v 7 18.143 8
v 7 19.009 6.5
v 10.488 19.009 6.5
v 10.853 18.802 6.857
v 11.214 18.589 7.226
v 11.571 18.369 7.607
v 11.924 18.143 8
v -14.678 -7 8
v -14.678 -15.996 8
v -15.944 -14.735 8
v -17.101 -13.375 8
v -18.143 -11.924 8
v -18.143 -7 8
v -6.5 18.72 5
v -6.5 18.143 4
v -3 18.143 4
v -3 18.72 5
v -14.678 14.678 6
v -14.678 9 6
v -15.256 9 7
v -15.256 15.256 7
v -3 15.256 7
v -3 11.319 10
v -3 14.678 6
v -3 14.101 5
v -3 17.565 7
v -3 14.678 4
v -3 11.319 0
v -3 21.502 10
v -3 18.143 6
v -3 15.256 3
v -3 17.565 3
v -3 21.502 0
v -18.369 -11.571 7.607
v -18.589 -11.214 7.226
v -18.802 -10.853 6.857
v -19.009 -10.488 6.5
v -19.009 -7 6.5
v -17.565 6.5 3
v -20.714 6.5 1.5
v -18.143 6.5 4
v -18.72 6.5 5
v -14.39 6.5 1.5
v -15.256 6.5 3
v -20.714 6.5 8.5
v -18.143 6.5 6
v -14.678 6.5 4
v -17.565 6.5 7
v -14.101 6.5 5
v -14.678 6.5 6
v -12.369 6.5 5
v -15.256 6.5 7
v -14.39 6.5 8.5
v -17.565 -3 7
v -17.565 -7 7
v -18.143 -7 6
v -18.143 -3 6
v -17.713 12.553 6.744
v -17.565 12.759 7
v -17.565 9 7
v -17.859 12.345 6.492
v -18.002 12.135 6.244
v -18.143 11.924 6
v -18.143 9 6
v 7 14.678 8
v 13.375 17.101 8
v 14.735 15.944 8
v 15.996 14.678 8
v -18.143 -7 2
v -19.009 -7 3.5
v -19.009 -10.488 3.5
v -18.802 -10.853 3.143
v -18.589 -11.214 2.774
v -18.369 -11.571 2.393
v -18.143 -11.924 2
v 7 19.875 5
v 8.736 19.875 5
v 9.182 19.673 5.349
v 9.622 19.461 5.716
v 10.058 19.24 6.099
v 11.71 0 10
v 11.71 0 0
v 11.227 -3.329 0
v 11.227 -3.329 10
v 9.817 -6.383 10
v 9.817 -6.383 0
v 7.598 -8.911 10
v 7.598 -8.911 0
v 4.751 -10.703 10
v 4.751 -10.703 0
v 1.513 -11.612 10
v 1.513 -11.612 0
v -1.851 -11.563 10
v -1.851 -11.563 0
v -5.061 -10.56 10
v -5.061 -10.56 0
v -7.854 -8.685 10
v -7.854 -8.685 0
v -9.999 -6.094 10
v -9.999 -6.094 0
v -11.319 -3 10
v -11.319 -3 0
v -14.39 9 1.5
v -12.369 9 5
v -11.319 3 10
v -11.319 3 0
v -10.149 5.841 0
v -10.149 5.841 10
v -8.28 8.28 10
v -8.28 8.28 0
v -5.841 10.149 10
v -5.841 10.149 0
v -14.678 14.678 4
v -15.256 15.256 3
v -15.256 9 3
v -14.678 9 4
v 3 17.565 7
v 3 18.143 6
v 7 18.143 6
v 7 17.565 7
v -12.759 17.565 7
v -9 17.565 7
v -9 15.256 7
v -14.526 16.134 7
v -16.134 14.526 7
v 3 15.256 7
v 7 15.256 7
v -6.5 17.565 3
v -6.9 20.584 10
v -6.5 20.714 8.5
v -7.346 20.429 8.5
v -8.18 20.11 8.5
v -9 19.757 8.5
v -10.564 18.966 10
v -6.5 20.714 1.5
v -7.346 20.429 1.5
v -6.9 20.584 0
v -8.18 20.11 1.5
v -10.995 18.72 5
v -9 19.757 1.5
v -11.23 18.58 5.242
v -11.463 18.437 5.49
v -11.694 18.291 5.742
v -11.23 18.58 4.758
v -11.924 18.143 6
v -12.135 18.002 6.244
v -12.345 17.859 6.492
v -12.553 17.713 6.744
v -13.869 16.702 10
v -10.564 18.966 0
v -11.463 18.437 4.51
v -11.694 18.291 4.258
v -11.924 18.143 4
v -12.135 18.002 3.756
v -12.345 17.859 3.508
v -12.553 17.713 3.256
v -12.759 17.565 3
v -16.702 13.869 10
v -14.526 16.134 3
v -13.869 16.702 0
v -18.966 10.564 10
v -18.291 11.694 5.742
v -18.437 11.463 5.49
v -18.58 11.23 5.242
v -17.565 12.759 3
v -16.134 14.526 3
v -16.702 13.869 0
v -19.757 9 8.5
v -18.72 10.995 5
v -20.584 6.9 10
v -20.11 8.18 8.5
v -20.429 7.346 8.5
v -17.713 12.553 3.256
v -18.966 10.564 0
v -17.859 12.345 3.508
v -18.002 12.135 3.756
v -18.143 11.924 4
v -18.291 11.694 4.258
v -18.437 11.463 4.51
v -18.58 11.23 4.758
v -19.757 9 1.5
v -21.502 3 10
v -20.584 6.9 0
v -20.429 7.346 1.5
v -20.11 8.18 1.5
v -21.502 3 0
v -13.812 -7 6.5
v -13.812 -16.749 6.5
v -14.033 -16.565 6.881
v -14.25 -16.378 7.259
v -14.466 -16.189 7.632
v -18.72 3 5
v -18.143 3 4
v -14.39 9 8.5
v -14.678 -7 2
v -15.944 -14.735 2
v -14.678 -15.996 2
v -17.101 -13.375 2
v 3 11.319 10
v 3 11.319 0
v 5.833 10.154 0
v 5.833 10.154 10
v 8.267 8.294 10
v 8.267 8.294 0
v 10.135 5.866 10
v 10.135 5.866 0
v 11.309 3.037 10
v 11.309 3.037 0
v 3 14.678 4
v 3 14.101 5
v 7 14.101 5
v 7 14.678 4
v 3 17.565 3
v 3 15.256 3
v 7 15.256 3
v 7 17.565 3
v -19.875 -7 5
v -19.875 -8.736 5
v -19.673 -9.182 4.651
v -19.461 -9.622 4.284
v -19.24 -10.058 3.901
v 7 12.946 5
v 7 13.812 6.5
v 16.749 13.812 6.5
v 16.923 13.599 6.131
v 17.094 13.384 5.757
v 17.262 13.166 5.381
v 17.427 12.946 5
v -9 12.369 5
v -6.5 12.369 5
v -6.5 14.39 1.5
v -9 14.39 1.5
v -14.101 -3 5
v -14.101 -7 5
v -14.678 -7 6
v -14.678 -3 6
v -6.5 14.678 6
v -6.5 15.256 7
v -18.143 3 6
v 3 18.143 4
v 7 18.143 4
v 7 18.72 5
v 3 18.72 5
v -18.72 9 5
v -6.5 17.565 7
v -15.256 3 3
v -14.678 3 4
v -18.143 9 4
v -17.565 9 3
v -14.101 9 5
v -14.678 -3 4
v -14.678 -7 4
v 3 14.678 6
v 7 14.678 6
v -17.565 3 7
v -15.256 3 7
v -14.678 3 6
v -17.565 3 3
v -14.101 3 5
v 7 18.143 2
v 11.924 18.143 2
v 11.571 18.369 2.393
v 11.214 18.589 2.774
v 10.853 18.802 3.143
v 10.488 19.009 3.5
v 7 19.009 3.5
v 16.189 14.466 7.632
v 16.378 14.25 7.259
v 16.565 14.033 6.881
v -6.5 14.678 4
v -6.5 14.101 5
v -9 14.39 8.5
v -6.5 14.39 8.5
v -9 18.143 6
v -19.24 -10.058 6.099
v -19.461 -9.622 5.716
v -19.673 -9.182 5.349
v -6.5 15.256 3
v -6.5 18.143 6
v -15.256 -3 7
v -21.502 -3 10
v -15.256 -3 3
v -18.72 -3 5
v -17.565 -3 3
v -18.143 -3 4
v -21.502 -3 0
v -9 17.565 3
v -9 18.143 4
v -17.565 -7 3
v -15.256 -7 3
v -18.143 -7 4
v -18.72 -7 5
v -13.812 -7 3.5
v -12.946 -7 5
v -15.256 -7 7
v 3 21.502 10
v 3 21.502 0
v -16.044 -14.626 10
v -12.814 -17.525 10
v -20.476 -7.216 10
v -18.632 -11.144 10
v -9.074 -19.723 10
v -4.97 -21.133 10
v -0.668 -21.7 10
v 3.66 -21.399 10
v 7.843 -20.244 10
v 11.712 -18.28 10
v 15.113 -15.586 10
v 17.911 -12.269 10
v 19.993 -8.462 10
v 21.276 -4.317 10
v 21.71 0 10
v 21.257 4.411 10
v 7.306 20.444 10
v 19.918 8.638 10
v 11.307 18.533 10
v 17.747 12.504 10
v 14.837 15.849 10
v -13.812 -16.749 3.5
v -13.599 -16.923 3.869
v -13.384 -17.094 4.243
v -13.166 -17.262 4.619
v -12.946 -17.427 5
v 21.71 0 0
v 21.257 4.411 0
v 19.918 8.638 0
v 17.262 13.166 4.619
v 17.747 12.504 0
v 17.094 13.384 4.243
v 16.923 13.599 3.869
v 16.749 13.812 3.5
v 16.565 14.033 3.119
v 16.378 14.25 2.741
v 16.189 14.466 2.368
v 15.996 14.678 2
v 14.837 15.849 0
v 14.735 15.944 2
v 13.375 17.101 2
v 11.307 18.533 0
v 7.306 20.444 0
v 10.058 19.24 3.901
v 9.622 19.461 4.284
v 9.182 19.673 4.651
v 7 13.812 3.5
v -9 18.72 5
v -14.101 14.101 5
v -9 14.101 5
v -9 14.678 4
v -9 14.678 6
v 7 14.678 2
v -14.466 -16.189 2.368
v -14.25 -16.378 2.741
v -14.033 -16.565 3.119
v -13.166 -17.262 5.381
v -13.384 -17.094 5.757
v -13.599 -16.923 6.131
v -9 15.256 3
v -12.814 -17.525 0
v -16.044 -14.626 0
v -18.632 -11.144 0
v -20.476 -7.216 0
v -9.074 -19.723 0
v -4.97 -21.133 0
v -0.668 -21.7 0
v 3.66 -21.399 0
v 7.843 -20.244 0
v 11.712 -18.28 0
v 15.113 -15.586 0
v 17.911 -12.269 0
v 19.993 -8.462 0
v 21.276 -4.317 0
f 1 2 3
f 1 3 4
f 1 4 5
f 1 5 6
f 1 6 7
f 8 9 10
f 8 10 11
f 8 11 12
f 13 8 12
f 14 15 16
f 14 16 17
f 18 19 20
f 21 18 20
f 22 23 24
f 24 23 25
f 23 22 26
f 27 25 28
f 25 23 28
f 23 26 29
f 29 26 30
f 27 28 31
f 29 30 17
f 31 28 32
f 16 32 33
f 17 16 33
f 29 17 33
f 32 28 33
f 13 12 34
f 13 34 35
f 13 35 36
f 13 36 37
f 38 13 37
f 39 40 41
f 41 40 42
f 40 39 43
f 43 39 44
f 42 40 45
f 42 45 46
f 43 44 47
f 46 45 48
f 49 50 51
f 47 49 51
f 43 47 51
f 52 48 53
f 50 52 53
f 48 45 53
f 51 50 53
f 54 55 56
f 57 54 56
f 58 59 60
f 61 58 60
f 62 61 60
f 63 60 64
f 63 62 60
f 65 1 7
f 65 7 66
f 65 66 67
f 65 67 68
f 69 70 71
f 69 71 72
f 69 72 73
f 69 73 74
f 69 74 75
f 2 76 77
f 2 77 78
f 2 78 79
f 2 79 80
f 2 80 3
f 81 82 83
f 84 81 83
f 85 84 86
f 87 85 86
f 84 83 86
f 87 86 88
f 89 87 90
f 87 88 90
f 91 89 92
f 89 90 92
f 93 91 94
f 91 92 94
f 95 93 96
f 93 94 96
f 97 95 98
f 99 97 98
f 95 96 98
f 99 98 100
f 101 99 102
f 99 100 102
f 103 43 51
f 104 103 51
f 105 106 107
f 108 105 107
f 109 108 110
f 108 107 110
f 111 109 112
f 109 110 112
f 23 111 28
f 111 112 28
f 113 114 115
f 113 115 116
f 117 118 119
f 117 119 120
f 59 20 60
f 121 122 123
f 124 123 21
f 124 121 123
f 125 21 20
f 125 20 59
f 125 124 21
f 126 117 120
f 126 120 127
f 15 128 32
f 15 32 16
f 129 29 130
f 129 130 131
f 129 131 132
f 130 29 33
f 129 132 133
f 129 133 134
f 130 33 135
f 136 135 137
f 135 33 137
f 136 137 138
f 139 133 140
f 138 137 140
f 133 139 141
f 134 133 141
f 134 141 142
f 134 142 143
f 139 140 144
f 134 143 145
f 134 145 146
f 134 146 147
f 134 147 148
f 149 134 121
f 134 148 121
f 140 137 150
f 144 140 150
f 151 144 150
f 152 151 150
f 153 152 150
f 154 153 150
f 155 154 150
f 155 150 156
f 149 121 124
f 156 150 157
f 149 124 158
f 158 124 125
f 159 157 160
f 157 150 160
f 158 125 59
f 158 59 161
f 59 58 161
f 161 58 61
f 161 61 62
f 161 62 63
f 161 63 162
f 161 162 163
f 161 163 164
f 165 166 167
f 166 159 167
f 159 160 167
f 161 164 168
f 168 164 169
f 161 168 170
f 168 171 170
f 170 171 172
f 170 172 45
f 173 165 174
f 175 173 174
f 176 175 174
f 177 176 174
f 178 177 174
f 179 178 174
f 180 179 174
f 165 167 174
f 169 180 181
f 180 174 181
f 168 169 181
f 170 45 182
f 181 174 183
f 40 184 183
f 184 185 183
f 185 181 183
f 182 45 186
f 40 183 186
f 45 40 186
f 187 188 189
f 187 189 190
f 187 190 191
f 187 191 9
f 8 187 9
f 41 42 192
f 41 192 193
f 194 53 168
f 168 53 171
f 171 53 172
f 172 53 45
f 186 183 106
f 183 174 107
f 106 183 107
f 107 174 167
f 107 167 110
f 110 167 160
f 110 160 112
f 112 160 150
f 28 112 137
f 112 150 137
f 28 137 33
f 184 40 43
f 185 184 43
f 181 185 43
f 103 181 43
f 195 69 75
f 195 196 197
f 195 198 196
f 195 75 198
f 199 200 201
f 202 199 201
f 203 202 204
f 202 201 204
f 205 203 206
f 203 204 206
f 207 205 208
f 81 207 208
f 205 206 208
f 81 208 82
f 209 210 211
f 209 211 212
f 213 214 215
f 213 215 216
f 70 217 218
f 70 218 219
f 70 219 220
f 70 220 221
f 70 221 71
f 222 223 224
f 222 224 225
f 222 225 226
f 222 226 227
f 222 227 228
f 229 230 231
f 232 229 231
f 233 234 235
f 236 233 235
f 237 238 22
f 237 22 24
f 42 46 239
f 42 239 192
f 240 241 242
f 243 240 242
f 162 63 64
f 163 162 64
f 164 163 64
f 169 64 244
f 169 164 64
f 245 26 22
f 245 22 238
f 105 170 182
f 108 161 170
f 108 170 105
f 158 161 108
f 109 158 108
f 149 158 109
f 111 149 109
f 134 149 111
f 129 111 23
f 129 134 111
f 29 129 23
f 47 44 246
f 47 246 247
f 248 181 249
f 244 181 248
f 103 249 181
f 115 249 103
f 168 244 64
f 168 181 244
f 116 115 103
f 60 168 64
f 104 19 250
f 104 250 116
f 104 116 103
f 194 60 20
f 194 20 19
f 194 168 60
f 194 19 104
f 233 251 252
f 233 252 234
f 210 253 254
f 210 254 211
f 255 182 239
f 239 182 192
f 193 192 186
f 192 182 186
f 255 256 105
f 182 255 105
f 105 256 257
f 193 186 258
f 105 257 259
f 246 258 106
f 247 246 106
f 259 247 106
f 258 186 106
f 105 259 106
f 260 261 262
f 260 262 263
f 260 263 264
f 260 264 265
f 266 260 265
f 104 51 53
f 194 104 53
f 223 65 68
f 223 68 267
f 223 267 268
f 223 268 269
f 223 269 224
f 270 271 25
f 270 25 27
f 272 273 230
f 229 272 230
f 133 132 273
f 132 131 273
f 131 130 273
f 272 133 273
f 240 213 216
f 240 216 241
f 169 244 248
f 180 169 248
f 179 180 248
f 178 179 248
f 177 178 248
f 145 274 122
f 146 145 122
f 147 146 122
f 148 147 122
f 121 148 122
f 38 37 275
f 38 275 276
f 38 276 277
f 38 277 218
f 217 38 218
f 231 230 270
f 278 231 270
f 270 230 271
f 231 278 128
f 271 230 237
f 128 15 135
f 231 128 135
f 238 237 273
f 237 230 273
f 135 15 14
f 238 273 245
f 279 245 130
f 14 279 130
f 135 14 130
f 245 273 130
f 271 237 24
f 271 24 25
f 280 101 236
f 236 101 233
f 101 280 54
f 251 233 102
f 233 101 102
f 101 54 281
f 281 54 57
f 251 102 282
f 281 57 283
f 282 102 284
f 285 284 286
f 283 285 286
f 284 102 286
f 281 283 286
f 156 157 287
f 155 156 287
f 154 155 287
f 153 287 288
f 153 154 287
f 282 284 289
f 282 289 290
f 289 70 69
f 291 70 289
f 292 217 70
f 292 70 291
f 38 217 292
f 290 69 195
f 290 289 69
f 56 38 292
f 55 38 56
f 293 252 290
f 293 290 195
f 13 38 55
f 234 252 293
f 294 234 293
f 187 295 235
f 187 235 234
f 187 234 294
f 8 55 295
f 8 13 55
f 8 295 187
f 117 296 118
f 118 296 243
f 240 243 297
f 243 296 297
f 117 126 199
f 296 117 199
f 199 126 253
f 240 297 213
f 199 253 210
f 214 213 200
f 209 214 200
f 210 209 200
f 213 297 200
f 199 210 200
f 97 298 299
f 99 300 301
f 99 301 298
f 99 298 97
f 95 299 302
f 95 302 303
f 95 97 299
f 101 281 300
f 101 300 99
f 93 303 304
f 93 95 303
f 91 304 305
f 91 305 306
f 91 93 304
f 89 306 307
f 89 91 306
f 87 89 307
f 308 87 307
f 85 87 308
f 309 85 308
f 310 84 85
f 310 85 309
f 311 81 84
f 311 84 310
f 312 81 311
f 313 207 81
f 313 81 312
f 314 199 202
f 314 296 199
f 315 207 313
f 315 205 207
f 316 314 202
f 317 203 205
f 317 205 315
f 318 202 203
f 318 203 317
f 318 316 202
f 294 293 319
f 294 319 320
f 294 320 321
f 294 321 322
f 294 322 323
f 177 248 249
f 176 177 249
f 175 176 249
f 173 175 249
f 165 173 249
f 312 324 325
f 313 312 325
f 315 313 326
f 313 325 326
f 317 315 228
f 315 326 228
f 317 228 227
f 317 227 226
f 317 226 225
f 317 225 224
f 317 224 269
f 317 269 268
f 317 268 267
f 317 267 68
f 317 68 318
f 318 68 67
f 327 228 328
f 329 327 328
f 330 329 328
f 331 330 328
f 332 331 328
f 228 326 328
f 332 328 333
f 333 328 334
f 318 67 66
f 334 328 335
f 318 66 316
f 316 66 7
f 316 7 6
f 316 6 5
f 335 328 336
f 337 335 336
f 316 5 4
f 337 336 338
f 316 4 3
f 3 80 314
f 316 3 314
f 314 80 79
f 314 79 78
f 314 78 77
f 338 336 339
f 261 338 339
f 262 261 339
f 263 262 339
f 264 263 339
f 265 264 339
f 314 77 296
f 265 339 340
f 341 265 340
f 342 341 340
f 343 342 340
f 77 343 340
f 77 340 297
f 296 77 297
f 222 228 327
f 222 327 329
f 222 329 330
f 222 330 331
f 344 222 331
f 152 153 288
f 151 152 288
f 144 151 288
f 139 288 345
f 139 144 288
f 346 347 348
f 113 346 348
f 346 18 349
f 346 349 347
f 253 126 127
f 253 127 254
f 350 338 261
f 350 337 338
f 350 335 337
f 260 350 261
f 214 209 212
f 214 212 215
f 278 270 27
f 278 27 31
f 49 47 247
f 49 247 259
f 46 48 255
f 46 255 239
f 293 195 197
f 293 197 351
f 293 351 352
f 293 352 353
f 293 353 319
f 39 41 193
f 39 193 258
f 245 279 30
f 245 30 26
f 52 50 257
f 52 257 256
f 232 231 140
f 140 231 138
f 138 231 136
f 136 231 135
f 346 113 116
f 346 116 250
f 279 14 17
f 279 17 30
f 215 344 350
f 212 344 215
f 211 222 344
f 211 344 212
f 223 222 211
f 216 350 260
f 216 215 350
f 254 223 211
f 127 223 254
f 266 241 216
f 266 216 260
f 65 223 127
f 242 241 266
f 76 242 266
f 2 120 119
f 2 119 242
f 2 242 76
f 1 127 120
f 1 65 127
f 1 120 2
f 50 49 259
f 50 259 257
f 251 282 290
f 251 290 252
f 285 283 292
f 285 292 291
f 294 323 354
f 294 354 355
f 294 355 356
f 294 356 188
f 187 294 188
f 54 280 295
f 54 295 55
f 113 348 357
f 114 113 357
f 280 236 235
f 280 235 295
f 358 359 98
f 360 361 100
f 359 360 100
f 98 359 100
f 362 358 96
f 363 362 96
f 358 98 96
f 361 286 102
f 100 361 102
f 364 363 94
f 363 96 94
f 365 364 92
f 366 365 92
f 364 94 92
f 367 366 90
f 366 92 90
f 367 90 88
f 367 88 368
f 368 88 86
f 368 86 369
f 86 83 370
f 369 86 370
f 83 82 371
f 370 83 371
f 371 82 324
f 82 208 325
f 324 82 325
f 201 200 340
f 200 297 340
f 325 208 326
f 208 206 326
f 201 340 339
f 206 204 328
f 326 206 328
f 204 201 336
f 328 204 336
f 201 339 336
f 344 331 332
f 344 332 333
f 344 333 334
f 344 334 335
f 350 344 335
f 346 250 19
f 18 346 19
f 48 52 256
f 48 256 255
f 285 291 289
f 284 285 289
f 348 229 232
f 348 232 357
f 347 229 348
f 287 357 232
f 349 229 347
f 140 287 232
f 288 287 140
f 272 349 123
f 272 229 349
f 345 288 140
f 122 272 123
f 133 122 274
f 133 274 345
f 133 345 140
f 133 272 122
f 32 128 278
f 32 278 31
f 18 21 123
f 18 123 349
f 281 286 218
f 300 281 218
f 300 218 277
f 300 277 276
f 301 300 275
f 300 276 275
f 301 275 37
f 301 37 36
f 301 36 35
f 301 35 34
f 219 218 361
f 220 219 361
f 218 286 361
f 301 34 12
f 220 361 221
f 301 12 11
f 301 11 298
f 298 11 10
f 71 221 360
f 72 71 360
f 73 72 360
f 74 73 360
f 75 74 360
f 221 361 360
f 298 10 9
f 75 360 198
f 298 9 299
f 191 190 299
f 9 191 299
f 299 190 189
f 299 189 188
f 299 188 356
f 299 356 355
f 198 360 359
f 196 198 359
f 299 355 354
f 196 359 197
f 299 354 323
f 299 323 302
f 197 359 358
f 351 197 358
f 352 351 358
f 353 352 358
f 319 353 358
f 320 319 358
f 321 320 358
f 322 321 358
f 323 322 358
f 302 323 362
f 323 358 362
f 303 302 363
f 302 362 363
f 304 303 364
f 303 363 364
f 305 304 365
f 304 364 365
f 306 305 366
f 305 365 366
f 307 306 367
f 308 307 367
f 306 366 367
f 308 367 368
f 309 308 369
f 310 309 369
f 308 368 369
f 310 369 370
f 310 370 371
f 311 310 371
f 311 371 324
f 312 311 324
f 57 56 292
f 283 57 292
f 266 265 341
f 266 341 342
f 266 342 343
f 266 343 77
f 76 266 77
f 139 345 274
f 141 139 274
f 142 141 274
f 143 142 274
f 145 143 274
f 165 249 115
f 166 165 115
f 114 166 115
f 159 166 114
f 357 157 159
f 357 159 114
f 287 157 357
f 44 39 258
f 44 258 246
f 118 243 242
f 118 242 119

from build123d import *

# Parameters (mm, degrees)
F1_DEPTH      = 10
F3_DEPTH      = 18.5027231868
F3_DEPTH_BACK = 24.711
F5_DEPTH      = 18.5027231868
F5_DEPTH_BACK = 24.711
F6_START      = 10
F6_DEPTH      = 15
F7_START      = 10
F7_DEPTH      = 15
F8_R          = 1.5
F9_DEPTH      = 25
F10_R         = 1.5
F11_DEPTH     = 25
F12_START     = -3.5
F12_DEPTH     = 2.5
F13_START     = -3.5
F13_DEPTH     = 2.5


with BuildPart() as f1:
    # F0 (on Top) → F1 (new body)
    with BuildSketch(Plane.XY):
        with BuildLine():
            ThreePointArc((-11.3191916673, 3), (-8.2802204077, 8.2802204077), (-3, 11.3191916673))
            Line((-3, 11.3191916673), (-3, 21.5017231868))
            ThreePointArc((-3, 21.5017231868), (-15.3512882196, 15.3512882196), (-21.5017231868, 3))
            Line((-21.5017231868, 3), (-11.3191916673, 3))
        make_face()
    extrude(amount=F1_DEPTH)


with BuildPart() as f1b:
    # F0 (on Top) → F1, piece 2 (new body)
    with BuildSketch(Plane.XY):
        with BuildLine():
            ThreePointArc((3, 11.3191916673), (9.2804660443, 7.1412218842), (11.71, 0))
            ThreePointArc((11.71, 0), (1.5126740522, -11.6118868928), (-11.3191916673, -3))
            Line((-11.3191916673, -3), (-21.5017231868, -3))
            ThreePointArc((-21.5017231868, -3), (1.5036105905, -21.6578682052), (21.71, 0))
            ThreePointArc((21.71, 0), (16.3776387187, 14.2512122291), (3, 21.5017231868))
            Line((3, 21.5017231868), (3, 11.3191916673))
        make_face()
    extrude(amount=F1_DEPTH)


with BuildPart() as f3_tool:
    # F2 (on face) → F3 (new body, two sides)
    with BuildSketch(Plane.XZ.offset(-3)) as f3_sk:
        with BuildLine():
            Line((-17.5651579654, 3), (-16.410457427, 3))
            ThreePointArc((-16.410457427, 3), (-17.4104574053, 3.2679491799), (-18.1425082096, 3.9999999567))
            Line((-18.1425082096, 3.9999999567), (-17.5651579654, 3))
        make_face()
        with BuildLine():
            Line((-15.2557568886, 3), (-14.6784066445, 3.9999999567))
            ThreePointArc((-14.6784066445, 3.9999999567), (-15.4104574487, 3.2679491799), (-16.410457427, 3))
            Line((-16.410457427, 3), (-15.2557568886, 3))
        make_face()
        with BuildLine():
            ThreePointArc((-14.6784066445, 6.0000000433), (-14.4786057809, 5.5176381144), (-14.410457427, 5))
            ThreePointArc((-14.410457427, 5), (-14.4786057809, 4.4823618856), (-14.6784066445, 3.9999999567))
            Line((-14.6784066445, 3.9999999567), (-14.1010563502, 5))
            Line((-14.1010563502, 5), (-14.6784066445, 6.0000000433))
        make_face()
        with BuildLine():
            ThreePointArc((-16.410457427, 7), (-15.4104574487, 6.7320508201), (-14.6784066445, 6.0000000433))
            Line((-14.6784066445, 6.0000000433), (-15.2557568886, 7))
            Line((-15.2557568886, 7), (-16.410457427, 7))
        make_face()
        with BuildLine():
            ThreePointArc((-18.1425082096, 3.9999999567), (-18.410457427, 4.9999999686), (-18.142508241, 5.9999999889))
            Line((-18.142508241, 5.9999999889), (-18.7198585038, 5))
            Line((-18.7198585038, 5), (-18.1425082096, 3.9999999567))
        make_face()
        with BuildLine():
            ThreePointArc((-14.6784066445, 3.9999999567), (-14.4786057809, 4.4823618856), (-14.410457427, 5))
            ThreePointArc((-14.410457427, 5), (-14.4786057809, 5.5176381144), (-14.6784066445, 6.0000000433))
            ThreePointArc((-14.6784066445, 6.0000000433), (-15.4104574487, 6.7320508201), (-16.410457427, 7))
            ThreePointArc((-16.410457427, 7), (-17.4104574326, 6.7320508044), (-18.142508241, 5.9999999889))
            ThreePointArc((-18.142508241, 5.9999999889), (-18.410457427, 4.9999999686), (-18.1425082096, 3.9999999567))
            ThreePointArc((-18.1425082096, 3.9999999567), (-17.4104574053, 3.2679491799), (-16.410457427, 3))
            ThreePointArc((-16.410457427, 3), (-15.4104574487, 3.2679491799), (-14.6784066445, 3.9999999567))
        make_face()
        with BuildLine():
            ThreePointArc((-18.142508241, 5.9999999889), (-17.4104574326, 6.7320508044), (-16.410457427, 7))
            Line((-16.410457427, 7), (-17.5651579654, 7))
            Line((-17.5651579654, 7), (-18.142508241, 5.9999999889))
        make_face()
    extrude(amount=-F3_DEPTH)
    extrude(f3_sk.sketch, amount=F3_DEPTH_BACK)


with BuildPart() as f1_1:
    add(f1.part)

    # F3: cut by f3_tool
    add(f3_tool.part, mode=Mode.SUBTRACT)


with BuildPart() as f1b_1:
    add(f1b.part)

    # F3: cut by f3_tool
    add(f3_tool.part, mode=Mode.SUBTRACT)


with BuildPart() as f5_tool:
    # F4 (on face) → F5 (new body, two sides)
    with BuildSketch(Plane.YZ.offset(-3)) as f5_sk:
        with BuildLine():
            ThreePointArc((16.410457427, 7), (17.4104574053, 6.7320508201), (18.1425082096, 6.0000000433))
            Line((18.1425082096, 6.0000000433), (17.5651579654, 7))
            Line((17.5651579654, 7), (16.410457427, 7))
        make_face()
        with BuildLine():
            Line((17.5651579654, 3), (18.142508241, 4.0000000111))
            ThreePointArc((18.142508241, 4.0000000111), (17.4104574326, 3.2679491956), (16.410457427, 3))
            Line((16.410457427, 3), (17.5651579654, 3))
        make_face()
        with BuildLine():
            ThreePointArc((18.1425082096, 6.0000000433), (18.3423090731, 5.5176381144), (18.410457427, 5))
            ThreePointArc((18.410457427, 5), (18.3423090812, 4.482361916), (18.142508241, 4.0000000111))
            Line((18.142508241, 4.0000000111), (18.7198585038, 5))
            Line((18.7198585038, 5), (18.1425082096, 6.0000000433))
        make_face()
        with BuildLine():
            ThreePointArc((14.6784066324, 6.0000000225), (15.4104574383, 6.7320508141), (16.410457427, 7))
            Line((16.410457427, 7), (15.2557568886, 7))
            Line((15.2557568886, 7), (14.6784066324, 6.0000000225))
        make_face()
        with BuildLine():
            ThreePointArc((14.678406613, 4.0000000111), (14.410457427, 5.0000000194), (14.6784066324, 6.0000000225))
            Line((14.6784066324, 6.0000000225), (14.1010563502, 5))
            Line((14.1010563502, 5), (14.678406613, 4.0000000111))
        make_face()
        with BuildLine():
            Line((15.2557568886, 3), (16.410457427, 3))
            ThreePointArc((16.410457427, 3), (15.4104574214, 3.2679491956), (14.678406613, 4.0000000111))
            Line((14.678406613, 4.0000000111), (15.2557568886, 3))
        make_face()
        with BuildLine():
            ThreePointArc((18.142508241, 4.0000000111), (18.3423090812, 4.482361916), (18.410457427, 5))
            ThreePointArc((18.410457427, 5), (18.3423090731, 5.5176381144), (18.1425082096, 6.0000000433))
            ThreePointArc((18.1425082096, 6.0000000433), (17.4104574053, 6.7320508201), (16.410457427, 7))
            ThreePointArc((16.410457427, 7), (15.4104574383, 6.7320508141), (14.6784066324, 6.0000000225))
            ThreePointArc((14.6784066324, 6.0000000225), (14.410457427, 5.0000000194), (14.678406613, 4.0000000111))
            ThreePointArc((14.678406613, 4.0000000111), (15.4104574214, 3.2679491956), (16.410457427, 3))
            ThreePointArc((16.410457427, 3), (17.4104574326, 3.2679491956), (18.142508241, 4.0000000111))
        make_face()
    extrude(amount=-F5_DEPTH)
    extrude(f5_sk.sketch, amount=F5_DEPTH_BACK)


with BuildPart() as f1_2:
    add(f1_1.part)

    # F5: cut by f5_tool
    add(f5_tool.part, mode=Mode.SUBTRACT)

    # F8 (on face) → F9 (cut)
    with BuildSketch(Plane(origin=(3, 0, 0), x_dir=(0, -1, 0), z_dir=(-1, 0, 0))):
        with Locations((-16.410457427, 5)):
            Circle(F8_R)
    extrude(amount=-F9_DEPTH, mode=Mode.SUBTRACT)

    # F10 (on face) → F11 (cut)
    with BuildSketch(Plane(origin=(0, -3, 0), x_dir=(-1, 0, 0), z_dir=(0, 1, 0))):
        with Locations((16.410457427, 5)):
            Circle(F10_R)
    extrude(amount=-F11_DEPTH, mode=Mode.SUBTRACT)

    # F4 (on face) → F12 (cut)
    with BuildSketch(Plane.YZ.offset(-3).offset(F12_START)):
        Polygon((20.4519093113, 5), (18.4311833692, 1.5), (21.5017231868, 1.5), (21.5017231868, 8.5), (18.4311833692, 8.5), align=None)
        Polygon((14.3897314848, 1.5), (18.4311833692, 1.5), (20.4519093113, 5), (18.4311833692, 8.5), (14.3897314848, 8.5), (12.3690055427, 5), align=None)
        Polygon((18.1425082346, 8), (19.0085336253, 6.5000000226), (19.8745590421, 5), (19.0085336636, 3.5000000436), (18.1425082346, 2), (16.410457427, 2), (14.6784066194, 2), (13.8123811995, 3.500000028), (12.9463558119, 5), (13.8123812433, 6.5000000478), (14.6784066194, 8), (16.410457427, 8), align=None, mode=Mode.SUBTRACT)
        with BuildLine():
            ThreePointArc((19.0085336253, 6.5000000226), (19.3082349025, 5.7764571479), (19.410457427, 5))
            ThreePointArc((19.410457427, 5), (19.3082349124, 4.223542889), (19.0085336636, 3.5000000436))
            Line((19.0085336636, 3.5000000436), (19.8745590421, 5))
            Line((19.8745590421, 5), (19.0085336253, 6.5000000226))
        make_face()
        with BuildLine():
            ThreePointArc((16.410457427, 8), (17.9104574157, 7.5980762179), (19.0085336253, 6.5000000226))
            Line((19.0085336253, 6.5000000226), (18.1425082346, 8))
            Line((18.1425082346, 8), (16.410457427, 8))
        make_face()
        with BuildLine():
            Line((18.1425082346, 2), (19.0085336636, 3.5000000436))
            ThreePointArc((19.0085336636, 3.5000000436), (17.9104574488, 2.4019238012), (16.410457427, 2))
            Line((16.410457427, 2), (18.1425082346, 2))
        make_face()
        with BuildLine():
            Line((14.6784066194, 2), (16.410457427, 2))
            ThreePointArc((16.410457427, 2), (14.910457413, 2.4019237967), (13.8123811995, 3.500000028))
            Line((13.8123811995, 3.500000028), (14.6784066194, 2))
        make_face()
        with BuildLine():
            ThreePointArc((13.8123811995, 3.500000028), (13.410457427, 5.0000000438), (13.8123812433, 6.5000000478))
            Line((13.8123812433, 6.5000000478), (12.9463558119, 5))
            Line((12.9463558119, 5), (13.8123811995, 3.500000028))
        make_face()
        with BuildLine():
            ThreePointArc((13.8123812433, 6.5000000478), (14.9104574509, 7.5980762252), (16.410457427, 8))
            Line((16.410457427, 8), (14.6784066194, 8))
            Line((14.6784066194, 8), (13.8123812433, 6.5000000478))
        make_face()
        with BuildLine():
            ThreePointArc((19.0085336636, 3.5000000436), (19.3082349124, 4.223542889), (19.410457427, 5))
            ThreePointArc((19.410457427, 5), (19.3082349025, 5.7764571479), (19.0085336253, 6.5000000226))
            ThreePointArc((19.0085336253, 6.5000000226), (17.9104574157, 7.5980762179), (16.410457427, 8))
            ThreePointArc((16.410457427, 8), (14.9104574509, 7.5980762252), (13.8123812433, 6.5000000478))
            ThreePointArc((13.8123812433, 6.5000000478), (13.410457427, 5.0000000438), (13.8123811995, 3.500000028))
            ThreePointArc((13.8123811995, 3.500000028), (14.910457413, 2.4019237967), (16.410457427, 2))
            ThreePointArc((16.410457427, 2), (17.9104574488, 2.4019238012), (19.0085336636, 3.5000000436))
        make_face()
        Polygon((17.5651579654, 7), (18.1425082096, 6.0000000433), (18.7198585038, 5), (18.142508241, 4.0000000111), (17.5651579654, 3), (16.410457427, 3), (15.2557568886, 3), (14.678406613, 4.0000000111), (14.1010563502, 5), (14.6784066324, 6.0000000225), (15.2557568886, 7), (16.410457427, 7), align=None, mode=Mode.SUBTRACT)
    extrude(amount=-F12_DEPTH, mode=Mode.SUBTRACT)

    # F2 (on face) → F13 (cut)
    with BuildSketch(Plane.XZ.offset(-3).offset(F13_START)):
        Polygon((-20.4519093113, 5), (-18.4311833692, 8.5), (-21.5017231868, 8.5), (-21.5017231868, 1.5), (-18.4311833692, 1.5), align=None)
        Polygon((-14.3897314848, 8.5), (-18.4311833692, 8.5), (-20.4519093113, 5), (-18.4311833692, 1.5), (-14.3897314848, 1.5), (-12.3690055427, 5), align=None)
        Polygon((-14.6784066194, 8), (-13.8123811905, 6.4999999564), (-12.9463558119, 5), (-13.8123812523, 3.4999999365), (-14.6784066194, 2), (-16.410457427, 2), (-18.1425082346, 2), (-19.0085336787, 3.5000000698), (-19.8745590421, 5), (-19.0085335545, 6.5000001453), (-18.1425082346, 8), (-16.410457427, 8), align=None, mode=Mode.SUBTRACT)
        with BuildLine():
            ThreePointArc((-19.0085336787, 3.5000000698), (-19.410457427, 5.0000001242), (-19.0085335545, 6.5000001453))
            Line((-19.0085335545, 6.5000001453), (-19.8745590421, 5))
            Line((-19.8745590421, 5), (-19.0085336787, 3.5000000698))
        make_face()
        with BuildLine():
            Line((-18.1425082346, 2), (-16.410457427, 2))
            ThreePointArc((-16.410457427, 2), (-17.9104574619, 2.4019238088), (-19.0085336787, 3.5000000698))
            Line((-19.0085336787, 3.5000000698), (-18.1425082346, 2))
        make_face()
        with BuildLine():
            ThreePointArc((-19.0085335545, 6.5000001453), (-17.9104573544, 7.5980762533), (-16.410457427, 8))
            Line((-16.410457427, 8), (-18.1425082346, 8))
            Line((-18.1425082346, 8), (-19.0085335545, 6.5000001453))
        make_face()
        with BuildLine():
            ThreePointArc((-16.410457427, 8), (-14.9104574052, 7.5980761988), (-13.8123811905, 6.4999999564))
            Line((-13.8123811905, 6.4999999564), (-14.6784066194, 8))
            Line((-14.6784066194, 8), (-16.410457427, 8))
        make_face()
        with BuildLine():
            ThreePointArc((-13.8123811905, 6.4999999564), (-13.5126799416, 5.776457111), (-13.410457427, 5))
            ThreePointArc((-13.410457427, 5), (-13.5126799576, 4.2235428293), (-13.8123812523, 3.4999999365))
            Line((-13.8123812523, 3.4999999365), (-12.9463558119, 5))
            Line((-12.9463558119, 5), (-13.8123811905, 6.4999999564))
        make_face()
        with BuildLine():
            Line((-14.6784066194, 2), (-13.8123812523, 3.4999999365))
            ThreePointArc((-13.8123812523, 3.4999999365), (-14.9104574587, 2.4019237703), (-16.410457427, 2))
            Line((-16.410457427, 2), (-14.6784066194, 2))
        make_face()
        with BuildLine():
            ThreePointArc((-13.8123812523, 3.4999999365), (-13.5126799576, 4.2235428293), (-13.410457427, 5))
            ThreePointArc((-13.410457427, 5), (-13.5126799416, 5.776457111), (-13.8123811905, 6.4999999564))
            ThreePointArc((-13.8123811905, 6.4999999564), (-14.9104574052, 7.5980761988), (-16.410457427, 8))
            ThreePointArc((-16.410457427, 8), (-17.9104573544, 7.5980762533), (-19.0085335545, 6.5000001453))
            ThreePointArc((-19.0085335545, 6.5000001453), (-19.410457427, 5.0000001242), (-19.0085336787, 3.5000000698))
            ThreePointArc((-19.0085336787, 3.5000000698), (-17.9104574619, 2.4019238088), (-16.410457427, 2))
            ThreePointArc((-16.410457427, 2), (-14.9104574587, 2.4019237703), (-13.8123812523, 3.4999999365))
        make_face()
        Polygon((-15.2557568886, 7), (-14.6784066445, 6.0000000433), (-14.1010563502, 5), (-14.6784066445, 3.9999999567), (-15.2557568886, 3), (-16.410457427, 3), (-17.5651579654, 3), (-18.1425082096, 3.9999999567), (-18.7198585038, 5), (-18.142508241, 5.9999999889), (-17.5651579654, 7), (-16.410457427, 7), align=None, mode=Mode.SUBTRACT)
    extrude(amount=-F13_DEPTH, mode=Mode.SUBTRACT)


with BuildPart() as f1b_2:
    add(f1b_1.part)

    # F5: cut by f5_tool
    add(f5_tool.part, mode=Mode.SUBTRACT)

    # F2 (on face) → F6 (cut)
    with BuildSketch(Plane.XZ.offset(-3).offset(F6_START)):
        with BuildLine():
            ThreePointArc((-13.8123812523, 3.4999999365), (-13.5126799576, 4.2235428293), (-13.410457427, 5))
            ThreePointArc((-13.410457427, 5), (-13.5126799416, 5.776457111), (-13.8123811905, 6.4999999564))
            ThreePointArc((-13.8123811905, 6.4999999564), (-14.9104574052, 7.5980761988), (-16.410457427, 8))
            ThreePointArc((-16.410457427, 8), (-17.9104573544, 7.5980762533), (-19.0085335545, 6.5000001453))
            ThreePointArc((-19.0085335545, 6.5000001453), (-19.410457427, 5.0000001242), (-19.0085336787, 3.5000000698))
            ThreePointArc((-19.0085336787, 3.5000000698), (-17.9104574619, 2.4019238088), (-16.410457427, 2))
            ThreePointArc((-16.410457427, 2), (-14.9104574587, 2.4019237703), (-13.8123812523, 3.4999999365))
        make_face()
        Polygon((-15.2557568886, 7), (-14.6784066445, 6.0000000433), (-14.1010563502, 5), (-14.6784066445, 3.9999999567), (-15.2557568886, 3), (-16.410457427, 3), (-17.5651579654, 3), (-18.1425082096, 3.9999999567), (-18.7198585038, 5), (-18.142508241, 5.9999999889), (-17.5651579654, 7), (-16.410457427, 7), align=None, mode=Mode.SUBTRACT)
        with BuildLine():
            ThreePointArc((-19.0085335545, 6.5000001453), (-17.9104573544, 7.5980762533), (-16.410457427, 8))
            Line((-16.410457427, 8), (-18.1425082346, 8))
            Line((-18.1425082346, 8), (-19.0085335545, 6.5000001453))
        make_face()
        with BuildLine():
            ThreePointArc((-19.0085336787, 3.5000000698), (-19.410457427, 5.0000001242), (-19.0085335545, 6.5000001453))
            Line((-19.0085335545, 6.5000001453), (-19.8745590421, 5))
            Line((-19.8745590421, 5), (-19.0085336787, 3.5000000698))
        make_face()
        with BuildLine():
            Line((-18.1425082346, 2), (-16.410457427, 2))
            ThreePointArc((-16.410457427, 2), (-17.9104574619, 2.4019238088), (-19.0085336787, 3.5000000698))
            Line((-19.0085336787, 3.5000000698), (-18.1425082346, 2))
        make_face()
        with BuildLine():
            Line((-14.6784066194, 2), (-13.8123812523, 3.4999999365))
            ThreePointArc((-13.8123812523, 3.4999999365), (-14.9104574587, 2.4019237703), (-16.410457427, 2))
            Line((-16.410457427, 2), (-14.6784066194, 2))
        make_face()
        with BuildLine():
            ThreePointArc((-13.8123811905, 6.4999999564), (-13.5126799416, 5.776457111), (-13.410457427, 5))
            ThreePointArc((-13.410457427, 5), (-13.5126799576, 4.2235428293), (-13.8123812523, 3.4999999365))
            Line((-13.8123812523, 3.4999999365), (-12.9463558119, 5))
            Line((-12.9463558119, 5), (-13.8123811905, 6.4999999564))
        make_face()
        with BuildLine():
            ThreePointArc((-16.410457427, 8), (-14.9104574052, 7.5980761988), (-13.8123811905, 6.4999999564))
            Line((-13.8123811905, 6.4999999564), (-14.6784066194, 8))
            Line((-14.6784066194, 8), (-16.410457427, 8))
        make_face()
        with BuildLine():
            ThreePointArc((-16.410457427, 7), (-15.4104574487, 6.7320508201), (-14.6784066445, 6.0000000433))
            Line((-14.6784066445, 6.0000000433), (-15.2557568886, 7))
            Line((-15.2557568886, 7), (-16.410457427, 7))
        make_face()
        with BuildLine():
            ThreePointArc((-18.142508241, 5.9999999889), (-17.4104574326, 6.7320508044), (-16.410457427, 7))
            Line((-16.410457427, 7), (-17.5651579654, 7))
            Line((-17.5651579654, 7), (-18.142508241, 5.9999999889))
        make_face()
        with BuildLine():
            ThreePointArc((-18.1425082096, 3.9999999567), (-18.410457427, 4.9999999686), (-18.142508241, 5.9999999889))
            Line((-18.142508241, 5.9999999889), (-18.7198585038, 5))
            Line((-18.7198585038, 5), (-18.1425082096, 3.9999999567))
        make_face()
        with BuildLine():
            Line((-17.5651579654, 3), (-16.410457427, 3))
            ThreePointArc((-16.410457427, 3), (-17.4104574053, 3.2679491799), (-18.1425082096, 3.9999999567))
            Line((-18.1425082096, 3.9999999567), (-17.5651579654, 3))
        make_face()
        with BuildLine():
            Line((-15.2557568886, 3), (-14.6784066445, 3.9999999567))
            ThreePointArc((-14.6784066445, 3.9999999567), (-15.4104574487, 3.2679491799), (-16.410457427, 3))
            Line((-16.410457427, 3), (-15.2557568886, 3))
        make_face()
        with BuildLine():
            ThreePointArc((-14.6784066445, 6.0000000433), (-14.4786057809, 5.5176381144), (-14.410457427, 5))
            ThreePointArc((-14.410457427, 5), (-14.4786057809, 4.4823618856), (-14.6784066445, 3.9999999567))
            Line((-14.6784066445, 3.9999999567), (-14.1010563502, 5))
            Line((-14.1010563502, 5), (-14.6784066445, 6.0000000433))
        make_face()
    extrude(amount=F6_DEPTH, mode=Mode.SUBTRACT)

    # F4 (on face) → F7 (cut)
    with BuildSketch(Plane.YZ.offset(-3).offset(F7_START)):
        with BuildLine():
            ThreePointArc((19.0085336636, 3.5000000436), (19.3082349124, 4.223542889), (19.410457427, 5))
            ThreePointArc((19.410457427, 5), (19.3082349025, 5.7764571479), (19.0085336253, 6.5000000226))
            ThreePointArc((19.0085336253, 6.5000000226), (17.9104574157, 7.5980762179), (16.410457427, 8))
            ThreePointArc((16.410457427, 8), (14.9104574509, 7.5980762252), (13.8123812433, 6.5000000478))
            ThreePointArc((13.8123812433, 6.5000000478), (13.410457427, 5.0000000438), (13.8123811995, 3.500000028))
            ThreePointArc((13.8123811995, 3.500000028), (14.910457413, 2.4019237967), (16.410457427, 2))
            ThreePointArc((16.410457427, 2), (17.9104574488, 2.4019238012), (19.0085336636, 3.5000000436))
        make_face()
        Polygon((17.5651579654, 7), (18.1425082096, 6.0000000433), (18.7198585038, 5), (18.142508241, 4.0000000111), (17.5651579654, 3), (16.410457427, 3), (15.2557568886, 3), (14.678406613, 4.0000000111), (14.1010563502, 5), (14.6784066324, 6.0000000225), (15.2557568886, 7), (16.410457427, 7), align=None, mode=Mode.SUBTRACT)
        with BuildLine():
            Line((18.1425082346, 2), (19.0085336636, 3.5000000436))
            ThreePointArc((19.0085336636, 3.5000000436), (17.9104574488, 2.4019238012), (16.410457427, 2))
            Line((16.410457427, 2), (18.1425082346, 2))
        make_face()
        with BuildLine():
            Line((14.6784066194, 2), (16.410457427, 2))
            ThreePointArc((16.410457427, 2), (14.910457413, 2.4019237967), (13.8123811995, 3.500000028))
            Line((13.8123811995, 3.500000028), (14.6784066194, 2))
        make_face()
        with BuildLine():
            ThreePointArc((13.8123811995, 3.500000028), (13.410457427, 5.0000000438), (13.8123812433, 6.5000000478))
            Line((13.8123812433, 6.5000000478), (12.9463558119, 5))
            Line((12.9463558119, 5), (13.8123811995, 3.500000028))
        make_face()
        with BuildLine():
            ThreePointArc((13.8123812433, 6.5000000478), (14.9104574509, 7.5980762252), (16.410457427, 8))
            Line((16.410457427, 8), (14.6784066194, 8))
            Line((14.6784066194, 8), (13.8123812433, 6.5000000478))
        make_face()
        with BuildLine():
            ThreePointArc((16.410457427, 8), (17.9104574157, 7.5980762179), (19.0085336253, 6.5000000226))
            Line((19.0085336253, 6.5000000226), (18.1425082346, 8))
            Line((18.1425082346, 8), (16.410457427, 8))
        make_face()
        with BuildLine():
            ThreePointArc((19.0085336253, 6.5000000226), (19.3082349025, 5.7764571479), (19.410457427, 5))
            ThreePointArc((19.410457427, 5), (19.3082349124, 4.223542889), (19.0085336636, 3.5000000436))
            Line((19.0085336636, 3.5000000436), (19.8745590421, 5))
            Line((19.8745590421, 5), (19.0085336253, 6.5000000226))
        make_face()
        with BuildLine():
            ThreePointArc((16.410457427, 7), (17.4104574053, 6.7320508201), (18.1425082096, 6.0000000433))
            Line((18.1425082096, 6.0000000433), (17.5651579654, 7))
            Line((17.5651579654, 7), (16.410457427, 7))
        make_face()
        with BuildLine():
            ThreePointArc((14.6784066324, 6.0000000225), (15.4104574383, 6.7320508141), (16.410457427, 7))
            Line((16.410457427, 7), (15.2557568886, 7))
            Line((15.2557568886, 7), (14.6784066324, 6.0000000225))
        make_face()
        with BuildLine():
            ThreePointArc((14.678406613, 4.0000000111), (14.410457427, 5.0000000194), (14.6784066324, 6.0000000225))
            Line((14.6784066324, 6.0000000225), (14.1010563502, 5))
            Line((14.1010563502, 5), (14.678406613, 4.0000000111))
        make_face()
        with BuildLine():
            Line((15.2557568886, 3), (16.410457427, 3))
            ThreePointArc((16.410457427, 3), (15.4104574214, 3.2679491956), (14.678406613, 4.0000000111))
            Line((14.678406613, 4.0000000111), (15.2557568886, 3))
        make_face()
        with BuildLine():
            Line((17.5651579654, 3), (18.142508241, 4.0000000111))
            ThreePointArc((18.142508241, 4.0000000111), (17.4104574326, 3.2679491956), (16.410457427, 3))
            Line((16.410457427, 3), (17.5651579654, 3))
        make_face()
        with BuildLine():
            ThreePointArc((18.1425082096, 6.0000000433), (18.3423090731, 5.5176381144), (18.410457427, 5))
            ThreePointArc((18.410457427, 5), (18.3423090812, 4.482361916), (18.142508241, 4.0000000111))
            Line((18.142508241, 4.0000000111), (18.7198585038, 5))
            Line((18.7198585038, 5), (18.1425082096, 6.0000000433))
        make_face()
    extrude(amount=F7_DEPTH, mode=Mode.SUBTRACT)


solid = Compound([f1_2.part, f1b_2.part])
